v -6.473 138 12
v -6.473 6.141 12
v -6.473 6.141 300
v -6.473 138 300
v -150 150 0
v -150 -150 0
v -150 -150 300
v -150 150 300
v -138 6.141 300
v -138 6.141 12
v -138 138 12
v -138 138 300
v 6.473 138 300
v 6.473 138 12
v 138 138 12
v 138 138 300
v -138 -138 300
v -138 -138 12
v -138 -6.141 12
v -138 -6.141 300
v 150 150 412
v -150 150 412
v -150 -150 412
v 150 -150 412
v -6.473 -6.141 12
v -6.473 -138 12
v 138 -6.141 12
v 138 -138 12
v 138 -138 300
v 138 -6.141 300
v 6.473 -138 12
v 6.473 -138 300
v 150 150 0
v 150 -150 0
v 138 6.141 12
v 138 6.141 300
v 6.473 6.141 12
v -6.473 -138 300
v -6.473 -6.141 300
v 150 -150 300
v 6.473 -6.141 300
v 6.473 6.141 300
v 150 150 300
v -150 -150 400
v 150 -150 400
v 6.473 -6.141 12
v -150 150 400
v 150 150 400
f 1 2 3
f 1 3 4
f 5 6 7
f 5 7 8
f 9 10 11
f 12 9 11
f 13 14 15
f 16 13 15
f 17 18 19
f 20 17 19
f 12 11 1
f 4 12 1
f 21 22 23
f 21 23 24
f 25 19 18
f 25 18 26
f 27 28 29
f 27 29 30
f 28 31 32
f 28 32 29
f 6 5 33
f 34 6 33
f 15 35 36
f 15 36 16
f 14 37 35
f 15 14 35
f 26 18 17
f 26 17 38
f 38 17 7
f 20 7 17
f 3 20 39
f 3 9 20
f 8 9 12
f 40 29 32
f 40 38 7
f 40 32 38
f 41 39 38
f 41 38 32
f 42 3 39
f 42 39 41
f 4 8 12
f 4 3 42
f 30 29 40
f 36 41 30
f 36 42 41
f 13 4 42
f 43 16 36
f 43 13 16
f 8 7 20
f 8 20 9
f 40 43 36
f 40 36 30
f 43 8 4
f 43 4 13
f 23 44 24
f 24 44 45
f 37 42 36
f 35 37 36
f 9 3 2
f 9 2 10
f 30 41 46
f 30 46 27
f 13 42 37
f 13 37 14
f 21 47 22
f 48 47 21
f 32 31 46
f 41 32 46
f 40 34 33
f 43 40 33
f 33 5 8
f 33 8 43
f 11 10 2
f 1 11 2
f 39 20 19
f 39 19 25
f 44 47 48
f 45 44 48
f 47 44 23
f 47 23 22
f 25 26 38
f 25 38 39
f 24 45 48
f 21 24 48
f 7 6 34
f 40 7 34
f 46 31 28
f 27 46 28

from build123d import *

# Parameters (mm, degrees)
F0_W     = 300
F0_H     = 300
F1_DEPTH = 300
F2_T     = -12
F3_W     = 131.5273979791
F3_H     = 12.2813489288
F3_W_2   = 12.9452040419
F3_H_2   = 131.8593255356
F4_DEPTH = 288
F6_W     = 300.0000076178
F6_H     = 300
F7_DEPTH = 12


with BuildPart() as f1:
    # F0 (on Top) → F1 (new body)
    with BuildSketch(Plane.XY):
        Rectangle(F0_W, F0_H)
    extrude(amount=F1_DEPTH)

    # F2
    f2_openings = [f1.faces().sort_by_distance(p)[0] for p in [
        (0, 0, 300),
    ]]
    offset(amount=F2_T, openings=f2_openings)

    # F3 (on face) → F4 (join)
    with BuildSketch(Plane.XY.offset(12)):
        with Locations((-72.2363010105, 0)):
            Rectangle(F3_W, F3_H)
        Rectangle(F3_W_2, F3_H)
        with Locations((0, 72.0703372322)):
            Rectangle(F3_W_2, F3_H_2)
        with Locations((72.2363010105, 0)):
            Rectangle(F3_W, F3_H)
        with Locations((0, -72.0703372322)):
            Rectangle(F3_W_2, F3_H_2)
    extrude(amount=F4_DEPTH)


with BuildPart() as f7:
    # F6 (on offset) → F7 (new body)
    with BuildSketch(Plane.XY.offset(400)):
        Rectangle(F6_W, F6_H)
    extrude(amount=F7_DEPTH)


solid = Compound([f1.part, f7.part])
